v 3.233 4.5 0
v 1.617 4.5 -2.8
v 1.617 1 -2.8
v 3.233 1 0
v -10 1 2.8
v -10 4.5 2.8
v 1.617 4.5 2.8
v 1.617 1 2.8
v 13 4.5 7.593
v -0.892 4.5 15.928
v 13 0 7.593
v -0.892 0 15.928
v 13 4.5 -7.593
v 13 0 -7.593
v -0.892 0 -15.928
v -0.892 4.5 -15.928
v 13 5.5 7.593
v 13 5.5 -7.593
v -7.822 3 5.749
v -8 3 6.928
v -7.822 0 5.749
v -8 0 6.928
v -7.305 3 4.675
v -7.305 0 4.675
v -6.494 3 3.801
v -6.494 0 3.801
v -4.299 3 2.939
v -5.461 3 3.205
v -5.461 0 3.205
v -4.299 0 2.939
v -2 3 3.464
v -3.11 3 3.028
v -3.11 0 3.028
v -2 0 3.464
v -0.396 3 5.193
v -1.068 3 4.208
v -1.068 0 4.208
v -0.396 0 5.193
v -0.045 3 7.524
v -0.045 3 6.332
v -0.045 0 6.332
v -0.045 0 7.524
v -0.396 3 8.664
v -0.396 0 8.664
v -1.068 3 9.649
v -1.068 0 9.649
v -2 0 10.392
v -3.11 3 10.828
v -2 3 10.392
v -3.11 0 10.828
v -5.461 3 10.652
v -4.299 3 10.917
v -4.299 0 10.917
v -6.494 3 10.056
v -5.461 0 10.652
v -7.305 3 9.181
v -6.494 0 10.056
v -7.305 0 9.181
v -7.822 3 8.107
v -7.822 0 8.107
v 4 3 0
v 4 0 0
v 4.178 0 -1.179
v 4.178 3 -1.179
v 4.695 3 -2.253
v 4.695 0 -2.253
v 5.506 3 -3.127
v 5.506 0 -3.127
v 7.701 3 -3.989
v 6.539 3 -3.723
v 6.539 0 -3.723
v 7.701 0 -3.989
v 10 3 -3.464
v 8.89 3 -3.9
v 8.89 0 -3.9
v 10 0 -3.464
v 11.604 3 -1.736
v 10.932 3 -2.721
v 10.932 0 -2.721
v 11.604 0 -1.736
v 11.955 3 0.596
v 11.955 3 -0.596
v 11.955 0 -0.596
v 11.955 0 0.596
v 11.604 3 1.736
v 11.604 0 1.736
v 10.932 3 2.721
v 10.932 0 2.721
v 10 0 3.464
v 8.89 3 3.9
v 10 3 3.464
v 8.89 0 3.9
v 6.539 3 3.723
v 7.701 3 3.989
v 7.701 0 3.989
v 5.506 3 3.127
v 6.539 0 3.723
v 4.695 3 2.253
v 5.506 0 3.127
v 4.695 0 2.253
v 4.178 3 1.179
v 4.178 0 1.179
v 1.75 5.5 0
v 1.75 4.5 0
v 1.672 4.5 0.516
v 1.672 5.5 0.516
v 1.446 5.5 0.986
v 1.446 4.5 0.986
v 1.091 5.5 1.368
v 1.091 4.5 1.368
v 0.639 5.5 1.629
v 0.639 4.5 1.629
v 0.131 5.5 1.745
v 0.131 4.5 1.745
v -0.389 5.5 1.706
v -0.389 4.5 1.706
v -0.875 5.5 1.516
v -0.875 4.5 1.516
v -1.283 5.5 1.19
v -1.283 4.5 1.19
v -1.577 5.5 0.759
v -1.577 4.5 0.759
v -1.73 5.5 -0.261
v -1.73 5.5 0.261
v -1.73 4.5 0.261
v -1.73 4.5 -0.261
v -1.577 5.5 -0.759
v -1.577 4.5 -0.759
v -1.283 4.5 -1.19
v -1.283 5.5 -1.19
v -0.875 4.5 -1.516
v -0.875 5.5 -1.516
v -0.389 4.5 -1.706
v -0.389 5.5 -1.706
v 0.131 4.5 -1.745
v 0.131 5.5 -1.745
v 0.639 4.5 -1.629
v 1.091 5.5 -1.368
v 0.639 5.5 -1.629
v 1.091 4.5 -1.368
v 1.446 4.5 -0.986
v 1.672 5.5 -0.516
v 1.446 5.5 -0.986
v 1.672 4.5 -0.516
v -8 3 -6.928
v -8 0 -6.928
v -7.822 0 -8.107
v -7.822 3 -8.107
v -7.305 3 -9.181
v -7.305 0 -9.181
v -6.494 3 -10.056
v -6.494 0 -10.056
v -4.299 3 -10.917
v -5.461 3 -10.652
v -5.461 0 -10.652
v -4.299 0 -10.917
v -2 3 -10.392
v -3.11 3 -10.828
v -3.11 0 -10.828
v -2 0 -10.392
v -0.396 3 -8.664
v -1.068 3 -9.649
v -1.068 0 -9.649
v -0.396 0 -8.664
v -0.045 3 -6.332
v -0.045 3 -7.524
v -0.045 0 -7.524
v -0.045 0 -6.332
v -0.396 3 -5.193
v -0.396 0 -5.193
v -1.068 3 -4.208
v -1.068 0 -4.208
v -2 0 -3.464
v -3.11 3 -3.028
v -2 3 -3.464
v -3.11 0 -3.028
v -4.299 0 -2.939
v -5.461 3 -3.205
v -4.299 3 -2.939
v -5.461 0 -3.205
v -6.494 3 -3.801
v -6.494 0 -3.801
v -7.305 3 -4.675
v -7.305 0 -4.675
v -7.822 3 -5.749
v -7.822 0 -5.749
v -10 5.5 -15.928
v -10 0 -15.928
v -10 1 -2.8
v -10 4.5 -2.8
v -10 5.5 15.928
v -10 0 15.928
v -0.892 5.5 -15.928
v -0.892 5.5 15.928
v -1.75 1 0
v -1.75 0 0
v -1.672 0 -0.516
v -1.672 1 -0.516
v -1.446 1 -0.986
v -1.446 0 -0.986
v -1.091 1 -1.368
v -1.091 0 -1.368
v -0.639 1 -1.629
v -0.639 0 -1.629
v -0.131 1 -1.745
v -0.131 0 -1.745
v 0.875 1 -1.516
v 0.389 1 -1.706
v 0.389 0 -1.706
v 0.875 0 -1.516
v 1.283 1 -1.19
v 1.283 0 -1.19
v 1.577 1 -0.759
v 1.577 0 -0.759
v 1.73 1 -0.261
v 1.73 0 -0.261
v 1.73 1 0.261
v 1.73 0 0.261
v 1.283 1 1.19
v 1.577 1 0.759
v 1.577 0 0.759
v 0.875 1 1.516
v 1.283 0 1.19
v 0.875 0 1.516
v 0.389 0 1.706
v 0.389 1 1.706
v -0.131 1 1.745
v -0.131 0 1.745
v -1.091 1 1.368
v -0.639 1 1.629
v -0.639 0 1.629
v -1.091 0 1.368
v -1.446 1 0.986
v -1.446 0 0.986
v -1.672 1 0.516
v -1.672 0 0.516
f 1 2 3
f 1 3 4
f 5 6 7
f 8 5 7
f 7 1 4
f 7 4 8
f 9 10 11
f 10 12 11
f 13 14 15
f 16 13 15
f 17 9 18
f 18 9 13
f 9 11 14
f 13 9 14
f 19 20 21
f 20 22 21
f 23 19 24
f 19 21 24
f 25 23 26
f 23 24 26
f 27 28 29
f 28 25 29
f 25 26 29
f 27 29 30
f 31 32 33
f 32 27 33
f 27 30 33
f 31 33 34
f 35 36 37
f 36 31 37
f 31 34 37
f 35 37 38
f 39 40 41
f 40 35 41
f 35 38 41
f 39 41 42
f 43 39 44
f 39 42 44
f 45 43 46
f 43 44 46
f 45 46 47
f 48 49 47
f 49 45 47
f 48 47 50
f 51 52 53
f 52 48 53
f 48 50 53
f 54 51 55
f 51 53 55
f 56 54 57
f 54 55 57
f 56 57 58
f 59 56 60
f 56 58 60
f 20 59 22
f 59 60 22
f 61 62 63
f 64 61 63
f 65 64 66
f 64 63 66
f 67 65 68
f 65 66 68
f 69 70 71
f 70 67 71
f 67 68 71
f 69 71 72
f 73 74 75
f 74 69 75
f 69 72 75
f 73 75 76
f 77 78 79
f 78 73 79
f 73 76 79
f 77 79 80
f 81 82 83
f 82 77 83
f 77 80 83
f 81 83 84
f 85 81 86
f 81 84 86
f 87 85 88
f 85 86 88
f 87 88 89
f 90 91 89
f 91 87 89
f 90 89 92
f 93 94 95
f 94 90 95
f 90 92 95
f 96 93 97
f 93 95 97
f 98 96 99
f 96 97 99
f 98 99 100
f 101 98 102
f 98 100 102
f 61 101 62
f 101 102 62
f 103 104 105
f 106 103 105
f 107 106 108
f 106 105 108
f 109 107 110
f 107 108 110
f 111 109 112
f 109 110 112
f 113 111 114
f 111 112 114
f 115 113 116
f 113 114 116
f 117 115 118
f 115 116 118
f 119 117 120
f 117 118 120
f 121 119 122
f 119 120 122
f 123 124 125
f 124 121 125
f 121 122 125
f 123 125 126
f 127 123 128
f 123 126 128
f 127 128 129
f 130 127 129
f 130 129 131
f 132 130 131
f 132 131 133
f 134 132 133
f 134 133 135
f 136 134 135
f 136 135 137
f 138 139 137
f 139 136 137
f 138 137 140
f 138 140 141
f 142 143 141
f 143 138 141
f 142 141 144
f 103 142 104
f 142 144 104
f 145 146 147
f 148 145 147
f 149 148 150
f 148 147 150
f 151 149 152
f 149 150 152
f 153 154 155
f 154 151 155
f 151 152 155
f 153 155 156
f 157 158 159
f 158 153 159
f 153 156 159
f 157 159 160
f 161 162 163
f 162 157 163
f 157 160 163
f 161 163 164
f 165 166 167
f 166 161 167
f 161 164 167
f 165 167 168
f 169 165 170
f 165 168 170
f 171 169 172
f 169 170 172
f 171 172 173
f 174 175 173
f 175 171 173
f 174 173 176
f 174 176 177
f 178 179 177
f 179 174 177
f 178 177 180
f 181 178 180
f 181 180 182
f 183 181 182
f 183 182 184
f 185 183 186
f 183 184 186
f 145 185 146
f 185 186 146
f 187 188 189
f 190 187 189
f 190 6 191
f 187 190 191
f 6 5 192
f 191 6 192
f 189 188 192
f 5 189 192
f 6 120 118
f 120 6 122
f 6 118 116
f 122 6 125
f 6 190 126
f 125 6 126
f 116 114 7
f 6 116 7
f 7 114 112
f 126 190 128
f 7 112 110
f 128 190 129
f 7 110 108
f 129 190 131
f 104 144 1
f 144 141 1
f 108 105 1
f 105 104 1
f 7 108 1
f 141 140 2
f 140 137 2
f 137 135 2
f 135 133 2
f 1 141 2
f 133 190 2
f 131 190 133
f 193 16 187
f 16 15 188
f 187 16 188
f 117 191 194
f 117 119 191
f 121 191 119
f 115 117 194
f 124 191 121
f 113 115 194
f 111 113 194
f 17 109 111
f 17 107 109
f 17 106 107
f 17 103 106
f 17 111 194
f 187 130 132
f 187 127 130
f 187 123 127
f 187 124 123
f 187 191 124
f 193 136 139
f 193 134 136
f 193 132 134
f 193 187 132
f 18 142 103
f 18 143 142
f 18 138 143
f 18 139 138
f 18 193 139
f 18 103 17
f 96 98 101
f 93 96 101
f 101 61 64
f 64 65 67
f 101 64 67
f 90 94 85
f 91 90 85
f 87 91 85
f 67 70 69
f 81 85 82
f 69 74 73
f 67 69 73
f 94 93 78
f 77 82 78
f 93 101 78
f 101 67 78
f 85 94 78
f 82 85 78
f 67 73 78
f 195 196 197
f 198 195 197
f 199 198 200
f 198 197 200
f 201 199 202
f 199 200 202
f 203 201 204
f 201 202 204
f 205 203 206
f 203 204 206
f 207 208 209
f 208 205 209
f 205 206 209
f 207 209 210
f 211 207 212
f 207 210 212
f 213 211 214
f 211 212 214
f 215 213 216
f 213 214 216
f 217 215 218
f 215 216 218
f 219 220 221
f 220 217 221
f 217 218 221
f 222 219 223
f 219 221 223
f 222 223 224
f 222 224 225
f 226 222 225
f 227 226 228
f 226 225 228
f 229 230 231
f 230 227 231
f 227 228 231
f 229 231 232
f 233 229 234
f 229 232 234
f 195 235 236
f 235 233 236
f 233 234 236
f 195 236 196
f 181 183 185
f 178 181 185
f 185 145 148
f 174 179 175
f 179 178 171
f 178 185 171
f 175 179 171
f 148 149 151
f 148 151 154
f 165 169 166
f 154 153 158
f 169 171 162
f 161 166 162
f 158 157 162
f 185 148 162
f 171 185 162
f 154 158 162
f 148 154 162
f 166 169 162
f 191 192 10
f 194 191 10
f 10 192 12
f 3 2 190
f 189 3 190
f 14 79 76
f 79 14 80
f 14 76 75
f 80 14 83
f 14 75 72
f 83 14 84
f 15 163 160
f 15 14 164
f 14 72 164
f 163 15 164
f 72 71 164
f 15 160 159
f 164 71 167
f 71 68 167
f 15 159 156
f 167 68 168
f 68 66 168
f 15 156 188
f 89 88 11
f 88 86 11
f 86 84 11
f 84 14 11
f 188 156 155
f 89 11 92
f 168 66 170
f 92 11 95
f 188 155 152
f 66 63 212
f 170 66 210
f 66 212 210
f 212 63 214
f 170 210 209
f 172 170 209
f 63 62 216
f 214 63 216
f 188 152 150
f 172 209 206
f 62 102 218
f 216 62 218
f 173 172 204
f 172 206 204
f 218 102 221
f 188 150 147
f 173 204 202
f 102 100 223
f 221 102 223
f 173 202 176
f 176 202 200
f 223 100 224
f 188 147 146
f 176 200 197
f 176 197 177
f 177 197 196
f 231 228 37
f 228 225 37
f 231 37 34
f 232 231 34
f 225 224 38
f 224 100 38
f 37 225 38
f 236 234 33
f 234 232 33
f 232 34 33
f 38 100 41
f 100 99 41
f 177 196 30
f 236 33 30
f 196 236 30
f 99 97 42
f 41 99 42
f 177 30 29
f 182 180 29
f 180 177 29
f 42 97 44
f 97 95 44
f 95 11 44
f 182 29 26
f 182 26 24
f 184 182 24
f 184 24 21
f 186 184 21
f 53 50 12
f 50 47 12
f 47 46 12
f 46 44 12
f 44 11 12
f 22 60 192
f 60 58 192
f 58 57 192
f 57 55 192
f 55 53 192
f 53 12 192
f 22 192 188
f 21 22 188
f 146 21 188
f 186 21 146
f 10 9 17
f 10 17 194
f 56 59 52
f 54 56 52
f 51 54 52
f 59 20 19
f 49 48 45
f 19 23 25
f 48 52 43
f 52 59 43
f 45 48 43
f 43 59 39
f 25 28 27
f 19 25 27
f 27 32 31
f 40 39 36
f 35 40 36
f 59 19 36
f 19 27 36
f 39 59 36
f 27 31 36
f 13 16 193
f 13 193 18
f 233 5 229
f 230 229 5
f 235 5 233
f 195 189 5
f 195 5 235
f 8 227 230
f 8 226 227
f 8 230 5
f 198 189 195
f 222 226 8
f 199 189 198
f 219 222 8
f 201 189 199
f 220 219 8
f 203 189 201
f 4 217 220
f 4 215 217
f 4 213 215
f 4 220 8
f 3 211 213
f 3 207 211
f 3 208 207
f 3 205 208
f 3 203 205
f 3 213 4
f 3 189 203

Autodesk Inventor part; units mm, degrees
ref_plane "YZ Plane" through (0, 0, 0) normal (1, 0, 0) x (0, 1, 0)
ref_plane "XZ Plane" through (0, 0, 0) normal (0, 1, 0) x (-1, 0, 0)
ref_plane "XY Plane" through (0, 0, 0) normal (0, 0, 1) x (1, 0, 0)
sketch "Sketch1" plane through (0, 0, 0) normal (0, 1, 0) x (-1, 0, 0)
  line L0 (-13, -11.9282) -> (10, -11.9282)
  line L1 (10, -11.9282) -> (10, 11.9282)
  line L2 (10, 11.9282) -> (-13, 11.9282)
  line L3 (-13, 11.9282) -> (-13, -11.9282)
  circle A0 centre (-8, 0) radius 4
  circle A1 centre (4, -6.9282) radius 4
  circle A2 centre (4, 6.9282) radius 4
  circle A3 centre (0, 0) radius 8 construction
  circle A4 centre (0, 0) radius 1.75
  dimension "d11" = 16
  dimension "d2" = 8
  dimension "d6" = 360
  dimension "d8" = 6
  dimension "d9" = 5
  dimension "d12" = 5
  dimension "d13" = 5
  dimension "d35" = 3.5
extrude "Extrusion1" add sketch "Sketch1" along normal blind 3
sketch "Sketch2" plane through (0, 3, 0) normal (0, 1, 0) x (1, 0, 0)
  circle A0 centre (-4, -6.9282) radius 4 projected
  circle A1 centre (-4, 6.9282) radius 4 projected
  circle A2 centre (8, 0) radius 4 projected
  line L0 (13, 11.9282) -> (-10, 11.9282) projected
  line L1 (-10, 11.9282) -> (-10, -11.9282) projected
  line L2 (-10, -11.9282) -> (13, -11.9282) projected
  line L3 (13, -11.9282) -> (13, 11.9282) projected
  circle A3 centre (0, 0) radius 1.75
  dimension "d16" = 3.5
extrude "Extrusion2" add sketch "Sketch2" along normal blind 1.5 contours A0 | A1 | A2 | L3 L2 L1 L0
sketch "Sketch3" plane through (0, 0, 0) normal (0, -1, 0) x (1, 0, 0)
  circle A0 centre (-4, 6.9282) radius 4 projected
  circle A1 centre (-4, -6.9282) radius 4 projected
  circle A2 centre (8, 0) radius 4 projected
  line L0 (13, -11.9282) -> (-10, -11.9282) projected
  line L1 (13, 11.9282) -> (13, -11.9282) projected
  line L2 (-10, 11.9282) -> (13, 11.9282) projected
  line L3 (-10, -11.9282) -> (-10, 11.9282) construction
  line L4 (-2, 11.9282) -> (13, 2.9282)
  line L5 (13, 11.9282) -> (13, -11.9282) projected
  line L6 (13, -2.9282) -> (-2, -11.9282)
  point P0 (0, 0)
  dimension "d19" = 9
  dimension "d20" = 9
  dimension "d21" = 15
  dimension "d22" = 15
extrude "Extrusion3" cut sketch "Sketch3" against normal through all contours L4 L2 L1 | L0 L6 L1
sketch "Sketch5" plane through (0, 0, 0) normal (0, -1, 0) x (1, 0, 0)
  line L0 (13, 2.9282) -> (-2, 11.9282) projected
  line L1 (-10, 11.9282) -> (-2, 11.9282) projected
  line L2 (-10, -11.9282) -> (-10, 11.9282) projected
  line L3 (-2, -11.9282) -> (-10, -11.9282) projected
  line L4 (-2, -11.9282) -> (13, -2.9282) projected
  line L5 (13, 2.9282) -> (13, -2.9282) projected
  circle A0 centre (-4, 6.9282) radius 4 projected
  circle A1 centre (-4, -6.9282) radius 4 projected
  circle A2 centre (8, 0) radius 4 projected
  line L6 (17, -5.193) -> (-0.8921, -15.9282)
  line L7 (-0.8921, -15.9282) -> (-14, -15.9282)
  line L8 (-14, -15.9282) -> (-14, 15.9282)
  line L9 (-14, 15.9282) -> (-0.8921, 15.9282)
  line L10 (-0.8921, 15.9282) -> (17, 5.193)
  line L11 (17, 5.193) -> (17, -5.193)
  line L12 (13, -2.9282) -> (13, -7.593)
  line L13 (13, 2.8448) -> (13, 7.593)
  line L14 (-2, -11.9282) -> (-10, -11.9282) projected
  line L15 (-10, -11.9282) -> (-10, -15.9282)
  line L16 (-10, 11.9282) -> (-2, 11.9282) projected
  line L17 (-10, 11.9282) -> (-10, 15.9282)
  line L18 (-2, -11.9282) -> (13, -2.9282) projected
  line L19 (13, -2.9282) -> (-2, -11.9282)
  line L20 (-2, -11.9282) -> (-10, -11.9282)
  line L21 (-10, -11.9282) -> (-10, 11.9282) projected
  line L22 (-10, 11.9282) -> (-2, 11.9282)
  line L23 (13, 2.9282) -> (-2, 11.9282) projected
  line L24 (13, 2.9282) -> (-2, 11.9282)
  line L25 (13, -2.9282) -> (13, 2.8448)
  point P0 (0, 0)
  dimension "d27" = 4
extrude "Extrusion5" add sketch "Sketch5" against normal up to surface (4.5 mm away) contours L0 L1 L17 L9 L10 L13 | L12 L6 L7 L15 L3 L4
sketch "Sketch6" plane through (0, 4.5, 0) normal (0, 1, 0) x (1, 0, 0)
  line L0 (13, -7.593) -> (13, 7.593) projected
  line L1 (-0.8921, 15.9282) -> (13, 7.593) projected
  line L2 (-10, 15.9282) -> (-0.8921, 15.9282) projected
  line L3 (-10, -15.9282) -> (-10, 15.9282) projected
  line L4 (-0.8921, -15.9282) -> (-10, -15.9282) projected
  line L5 (13, -7.593) -> (-0.8921, -15.9282) projected
  line L6 (13, 7.593) -> (-0.8921, 15.9282)
  line L7 (-0.8921, 15.9282) -> (-2.4356, 13.3557)
  line L8 (-2.4356, 13.3557) -> (11.4565, 5.0205)
  line L9 (11.4565, 5.0205) -> (13, 7.593)
  line L10 (13, -7.593) -> (13, 7.593) projected
  line L11 (13, -7.593) -> (-0.8921, -15.9282)
  line L12 (-0.8921, -15.9282) -> (-2.4356, -13.3557)
  line L13 (-2.4356, -13.3557) -> (11.4565, -5.0205)
  line L14 (11.4565, -5.0205) -> (13, -7.593)
  point P0 (0, 0)
  dimension "d30" = 3
  dimension "d31" = 3
extrude "Extrusion6" [suppressed]
sketch "Sketch7" plane through (0, 4.5, 0) normal (0, 1, 0) x (1, 0, 0)
  line L0 (13, -7.593) -> (13, 7.593) projected
  line L1 (-0.8921, 15.9282) -> (13, 7.593) projected
  line L2 (-10, 15.9282) -> (-0.8921, 15.9282) projected
  line L3 (-10, -15.9282) -> (-10, 15.9282) projected
  line L4 (-0.8921, -15.9282) -> (-10, -15.9282) projected
  line L5 (13, -7.593) -> (-0.8921, -15.9282) projected
  circle A0 centre (0, 0) radius 1.75 projected
  line L6 (1.6166, 2.8) -> (3.2332, 0)
  line L7 (3.2332, 0) -> (1.6166, -2.8)
  line L8 (1.6166, -2.8) -> (-1.6166, -2.8)
  line L9 (-1.6166, -2.8) -> (-3.2332, 0)
  line L10 (-3.2332, 0) -> (-1.6166, 2.8)
  line L11 (-1.6166, 2.8) -> (1.6166, 2.8)
  line L12 (-1.6166, 2.8) -> (-11.6048, 2.8)
  line L13 (-11.6048, 2.8) -> (-11.6048, -2.8)
  line L14 (-11.6048, -2.8) -> (-1.6166, -2.8)
  line L15 (-1.6166, -2.8) -> (-1.6166, 2.8)
  dimension "d39" = 5.6
extrude "Extrusion7" cut sketch "Sketch7" against normal blind 3.5 contours L14 L13 L12 L3 | L3 L12 L10 L9 L14 | L15 A0 L11 L6 L7 L8 | L9 L10 L15 A0
sketch "Sketch8" plane through (0, 4.5, 0) normal (0, 1, 0) x (1, 0, 0)
  line L0 (-10, 2.8) -> (1.6166, 2.8) projected
  line L1 (1.6166, 2.8) -> (3.2332, 0) projected
  line L2 (3.2332, 0) -> (1.6166, -2.8) projected
  line L3 (1.6166, -2.8) -> (-10, -2.8) projected
  line L4 (-10, -15.9282) -> (-10, -2.8) projected
  line L5 (-0.8921, -15.9282) -> (-10, -15.9282) projected
  line L6 (13, -7.593) -> (-0.8921, -15.9282) projected
  line L7 (13, -7.593) -> (13, 7.593) projected
  line L8 (-0.8921, 15.9282) -> (13, 7.593) projected
  line L9 (-10, 15.9282) -> (-0.8921, 15.9282) projected
  line L10 (-10, 2.8) -> (-10, 15.9282) projected
  line L11 (-10, 2.8) -> (-10, 15.9282) projected
  line L12 (-10, -15.9282) -> (-10, -2.8) projected
  line L13 (-10, 2.8) -> (-10, -2.8)
  circle A0 centre (0, 0) radius 1.75 projected
extrude "Extrusion8" add sketch "Sketch8" along normal blind 1
equation "\"d12\" = d9"
equation "\"d13\" = d9"
properties part number "30_Cube_Z_Focus_Drylin_NEMA_slide_part1"
